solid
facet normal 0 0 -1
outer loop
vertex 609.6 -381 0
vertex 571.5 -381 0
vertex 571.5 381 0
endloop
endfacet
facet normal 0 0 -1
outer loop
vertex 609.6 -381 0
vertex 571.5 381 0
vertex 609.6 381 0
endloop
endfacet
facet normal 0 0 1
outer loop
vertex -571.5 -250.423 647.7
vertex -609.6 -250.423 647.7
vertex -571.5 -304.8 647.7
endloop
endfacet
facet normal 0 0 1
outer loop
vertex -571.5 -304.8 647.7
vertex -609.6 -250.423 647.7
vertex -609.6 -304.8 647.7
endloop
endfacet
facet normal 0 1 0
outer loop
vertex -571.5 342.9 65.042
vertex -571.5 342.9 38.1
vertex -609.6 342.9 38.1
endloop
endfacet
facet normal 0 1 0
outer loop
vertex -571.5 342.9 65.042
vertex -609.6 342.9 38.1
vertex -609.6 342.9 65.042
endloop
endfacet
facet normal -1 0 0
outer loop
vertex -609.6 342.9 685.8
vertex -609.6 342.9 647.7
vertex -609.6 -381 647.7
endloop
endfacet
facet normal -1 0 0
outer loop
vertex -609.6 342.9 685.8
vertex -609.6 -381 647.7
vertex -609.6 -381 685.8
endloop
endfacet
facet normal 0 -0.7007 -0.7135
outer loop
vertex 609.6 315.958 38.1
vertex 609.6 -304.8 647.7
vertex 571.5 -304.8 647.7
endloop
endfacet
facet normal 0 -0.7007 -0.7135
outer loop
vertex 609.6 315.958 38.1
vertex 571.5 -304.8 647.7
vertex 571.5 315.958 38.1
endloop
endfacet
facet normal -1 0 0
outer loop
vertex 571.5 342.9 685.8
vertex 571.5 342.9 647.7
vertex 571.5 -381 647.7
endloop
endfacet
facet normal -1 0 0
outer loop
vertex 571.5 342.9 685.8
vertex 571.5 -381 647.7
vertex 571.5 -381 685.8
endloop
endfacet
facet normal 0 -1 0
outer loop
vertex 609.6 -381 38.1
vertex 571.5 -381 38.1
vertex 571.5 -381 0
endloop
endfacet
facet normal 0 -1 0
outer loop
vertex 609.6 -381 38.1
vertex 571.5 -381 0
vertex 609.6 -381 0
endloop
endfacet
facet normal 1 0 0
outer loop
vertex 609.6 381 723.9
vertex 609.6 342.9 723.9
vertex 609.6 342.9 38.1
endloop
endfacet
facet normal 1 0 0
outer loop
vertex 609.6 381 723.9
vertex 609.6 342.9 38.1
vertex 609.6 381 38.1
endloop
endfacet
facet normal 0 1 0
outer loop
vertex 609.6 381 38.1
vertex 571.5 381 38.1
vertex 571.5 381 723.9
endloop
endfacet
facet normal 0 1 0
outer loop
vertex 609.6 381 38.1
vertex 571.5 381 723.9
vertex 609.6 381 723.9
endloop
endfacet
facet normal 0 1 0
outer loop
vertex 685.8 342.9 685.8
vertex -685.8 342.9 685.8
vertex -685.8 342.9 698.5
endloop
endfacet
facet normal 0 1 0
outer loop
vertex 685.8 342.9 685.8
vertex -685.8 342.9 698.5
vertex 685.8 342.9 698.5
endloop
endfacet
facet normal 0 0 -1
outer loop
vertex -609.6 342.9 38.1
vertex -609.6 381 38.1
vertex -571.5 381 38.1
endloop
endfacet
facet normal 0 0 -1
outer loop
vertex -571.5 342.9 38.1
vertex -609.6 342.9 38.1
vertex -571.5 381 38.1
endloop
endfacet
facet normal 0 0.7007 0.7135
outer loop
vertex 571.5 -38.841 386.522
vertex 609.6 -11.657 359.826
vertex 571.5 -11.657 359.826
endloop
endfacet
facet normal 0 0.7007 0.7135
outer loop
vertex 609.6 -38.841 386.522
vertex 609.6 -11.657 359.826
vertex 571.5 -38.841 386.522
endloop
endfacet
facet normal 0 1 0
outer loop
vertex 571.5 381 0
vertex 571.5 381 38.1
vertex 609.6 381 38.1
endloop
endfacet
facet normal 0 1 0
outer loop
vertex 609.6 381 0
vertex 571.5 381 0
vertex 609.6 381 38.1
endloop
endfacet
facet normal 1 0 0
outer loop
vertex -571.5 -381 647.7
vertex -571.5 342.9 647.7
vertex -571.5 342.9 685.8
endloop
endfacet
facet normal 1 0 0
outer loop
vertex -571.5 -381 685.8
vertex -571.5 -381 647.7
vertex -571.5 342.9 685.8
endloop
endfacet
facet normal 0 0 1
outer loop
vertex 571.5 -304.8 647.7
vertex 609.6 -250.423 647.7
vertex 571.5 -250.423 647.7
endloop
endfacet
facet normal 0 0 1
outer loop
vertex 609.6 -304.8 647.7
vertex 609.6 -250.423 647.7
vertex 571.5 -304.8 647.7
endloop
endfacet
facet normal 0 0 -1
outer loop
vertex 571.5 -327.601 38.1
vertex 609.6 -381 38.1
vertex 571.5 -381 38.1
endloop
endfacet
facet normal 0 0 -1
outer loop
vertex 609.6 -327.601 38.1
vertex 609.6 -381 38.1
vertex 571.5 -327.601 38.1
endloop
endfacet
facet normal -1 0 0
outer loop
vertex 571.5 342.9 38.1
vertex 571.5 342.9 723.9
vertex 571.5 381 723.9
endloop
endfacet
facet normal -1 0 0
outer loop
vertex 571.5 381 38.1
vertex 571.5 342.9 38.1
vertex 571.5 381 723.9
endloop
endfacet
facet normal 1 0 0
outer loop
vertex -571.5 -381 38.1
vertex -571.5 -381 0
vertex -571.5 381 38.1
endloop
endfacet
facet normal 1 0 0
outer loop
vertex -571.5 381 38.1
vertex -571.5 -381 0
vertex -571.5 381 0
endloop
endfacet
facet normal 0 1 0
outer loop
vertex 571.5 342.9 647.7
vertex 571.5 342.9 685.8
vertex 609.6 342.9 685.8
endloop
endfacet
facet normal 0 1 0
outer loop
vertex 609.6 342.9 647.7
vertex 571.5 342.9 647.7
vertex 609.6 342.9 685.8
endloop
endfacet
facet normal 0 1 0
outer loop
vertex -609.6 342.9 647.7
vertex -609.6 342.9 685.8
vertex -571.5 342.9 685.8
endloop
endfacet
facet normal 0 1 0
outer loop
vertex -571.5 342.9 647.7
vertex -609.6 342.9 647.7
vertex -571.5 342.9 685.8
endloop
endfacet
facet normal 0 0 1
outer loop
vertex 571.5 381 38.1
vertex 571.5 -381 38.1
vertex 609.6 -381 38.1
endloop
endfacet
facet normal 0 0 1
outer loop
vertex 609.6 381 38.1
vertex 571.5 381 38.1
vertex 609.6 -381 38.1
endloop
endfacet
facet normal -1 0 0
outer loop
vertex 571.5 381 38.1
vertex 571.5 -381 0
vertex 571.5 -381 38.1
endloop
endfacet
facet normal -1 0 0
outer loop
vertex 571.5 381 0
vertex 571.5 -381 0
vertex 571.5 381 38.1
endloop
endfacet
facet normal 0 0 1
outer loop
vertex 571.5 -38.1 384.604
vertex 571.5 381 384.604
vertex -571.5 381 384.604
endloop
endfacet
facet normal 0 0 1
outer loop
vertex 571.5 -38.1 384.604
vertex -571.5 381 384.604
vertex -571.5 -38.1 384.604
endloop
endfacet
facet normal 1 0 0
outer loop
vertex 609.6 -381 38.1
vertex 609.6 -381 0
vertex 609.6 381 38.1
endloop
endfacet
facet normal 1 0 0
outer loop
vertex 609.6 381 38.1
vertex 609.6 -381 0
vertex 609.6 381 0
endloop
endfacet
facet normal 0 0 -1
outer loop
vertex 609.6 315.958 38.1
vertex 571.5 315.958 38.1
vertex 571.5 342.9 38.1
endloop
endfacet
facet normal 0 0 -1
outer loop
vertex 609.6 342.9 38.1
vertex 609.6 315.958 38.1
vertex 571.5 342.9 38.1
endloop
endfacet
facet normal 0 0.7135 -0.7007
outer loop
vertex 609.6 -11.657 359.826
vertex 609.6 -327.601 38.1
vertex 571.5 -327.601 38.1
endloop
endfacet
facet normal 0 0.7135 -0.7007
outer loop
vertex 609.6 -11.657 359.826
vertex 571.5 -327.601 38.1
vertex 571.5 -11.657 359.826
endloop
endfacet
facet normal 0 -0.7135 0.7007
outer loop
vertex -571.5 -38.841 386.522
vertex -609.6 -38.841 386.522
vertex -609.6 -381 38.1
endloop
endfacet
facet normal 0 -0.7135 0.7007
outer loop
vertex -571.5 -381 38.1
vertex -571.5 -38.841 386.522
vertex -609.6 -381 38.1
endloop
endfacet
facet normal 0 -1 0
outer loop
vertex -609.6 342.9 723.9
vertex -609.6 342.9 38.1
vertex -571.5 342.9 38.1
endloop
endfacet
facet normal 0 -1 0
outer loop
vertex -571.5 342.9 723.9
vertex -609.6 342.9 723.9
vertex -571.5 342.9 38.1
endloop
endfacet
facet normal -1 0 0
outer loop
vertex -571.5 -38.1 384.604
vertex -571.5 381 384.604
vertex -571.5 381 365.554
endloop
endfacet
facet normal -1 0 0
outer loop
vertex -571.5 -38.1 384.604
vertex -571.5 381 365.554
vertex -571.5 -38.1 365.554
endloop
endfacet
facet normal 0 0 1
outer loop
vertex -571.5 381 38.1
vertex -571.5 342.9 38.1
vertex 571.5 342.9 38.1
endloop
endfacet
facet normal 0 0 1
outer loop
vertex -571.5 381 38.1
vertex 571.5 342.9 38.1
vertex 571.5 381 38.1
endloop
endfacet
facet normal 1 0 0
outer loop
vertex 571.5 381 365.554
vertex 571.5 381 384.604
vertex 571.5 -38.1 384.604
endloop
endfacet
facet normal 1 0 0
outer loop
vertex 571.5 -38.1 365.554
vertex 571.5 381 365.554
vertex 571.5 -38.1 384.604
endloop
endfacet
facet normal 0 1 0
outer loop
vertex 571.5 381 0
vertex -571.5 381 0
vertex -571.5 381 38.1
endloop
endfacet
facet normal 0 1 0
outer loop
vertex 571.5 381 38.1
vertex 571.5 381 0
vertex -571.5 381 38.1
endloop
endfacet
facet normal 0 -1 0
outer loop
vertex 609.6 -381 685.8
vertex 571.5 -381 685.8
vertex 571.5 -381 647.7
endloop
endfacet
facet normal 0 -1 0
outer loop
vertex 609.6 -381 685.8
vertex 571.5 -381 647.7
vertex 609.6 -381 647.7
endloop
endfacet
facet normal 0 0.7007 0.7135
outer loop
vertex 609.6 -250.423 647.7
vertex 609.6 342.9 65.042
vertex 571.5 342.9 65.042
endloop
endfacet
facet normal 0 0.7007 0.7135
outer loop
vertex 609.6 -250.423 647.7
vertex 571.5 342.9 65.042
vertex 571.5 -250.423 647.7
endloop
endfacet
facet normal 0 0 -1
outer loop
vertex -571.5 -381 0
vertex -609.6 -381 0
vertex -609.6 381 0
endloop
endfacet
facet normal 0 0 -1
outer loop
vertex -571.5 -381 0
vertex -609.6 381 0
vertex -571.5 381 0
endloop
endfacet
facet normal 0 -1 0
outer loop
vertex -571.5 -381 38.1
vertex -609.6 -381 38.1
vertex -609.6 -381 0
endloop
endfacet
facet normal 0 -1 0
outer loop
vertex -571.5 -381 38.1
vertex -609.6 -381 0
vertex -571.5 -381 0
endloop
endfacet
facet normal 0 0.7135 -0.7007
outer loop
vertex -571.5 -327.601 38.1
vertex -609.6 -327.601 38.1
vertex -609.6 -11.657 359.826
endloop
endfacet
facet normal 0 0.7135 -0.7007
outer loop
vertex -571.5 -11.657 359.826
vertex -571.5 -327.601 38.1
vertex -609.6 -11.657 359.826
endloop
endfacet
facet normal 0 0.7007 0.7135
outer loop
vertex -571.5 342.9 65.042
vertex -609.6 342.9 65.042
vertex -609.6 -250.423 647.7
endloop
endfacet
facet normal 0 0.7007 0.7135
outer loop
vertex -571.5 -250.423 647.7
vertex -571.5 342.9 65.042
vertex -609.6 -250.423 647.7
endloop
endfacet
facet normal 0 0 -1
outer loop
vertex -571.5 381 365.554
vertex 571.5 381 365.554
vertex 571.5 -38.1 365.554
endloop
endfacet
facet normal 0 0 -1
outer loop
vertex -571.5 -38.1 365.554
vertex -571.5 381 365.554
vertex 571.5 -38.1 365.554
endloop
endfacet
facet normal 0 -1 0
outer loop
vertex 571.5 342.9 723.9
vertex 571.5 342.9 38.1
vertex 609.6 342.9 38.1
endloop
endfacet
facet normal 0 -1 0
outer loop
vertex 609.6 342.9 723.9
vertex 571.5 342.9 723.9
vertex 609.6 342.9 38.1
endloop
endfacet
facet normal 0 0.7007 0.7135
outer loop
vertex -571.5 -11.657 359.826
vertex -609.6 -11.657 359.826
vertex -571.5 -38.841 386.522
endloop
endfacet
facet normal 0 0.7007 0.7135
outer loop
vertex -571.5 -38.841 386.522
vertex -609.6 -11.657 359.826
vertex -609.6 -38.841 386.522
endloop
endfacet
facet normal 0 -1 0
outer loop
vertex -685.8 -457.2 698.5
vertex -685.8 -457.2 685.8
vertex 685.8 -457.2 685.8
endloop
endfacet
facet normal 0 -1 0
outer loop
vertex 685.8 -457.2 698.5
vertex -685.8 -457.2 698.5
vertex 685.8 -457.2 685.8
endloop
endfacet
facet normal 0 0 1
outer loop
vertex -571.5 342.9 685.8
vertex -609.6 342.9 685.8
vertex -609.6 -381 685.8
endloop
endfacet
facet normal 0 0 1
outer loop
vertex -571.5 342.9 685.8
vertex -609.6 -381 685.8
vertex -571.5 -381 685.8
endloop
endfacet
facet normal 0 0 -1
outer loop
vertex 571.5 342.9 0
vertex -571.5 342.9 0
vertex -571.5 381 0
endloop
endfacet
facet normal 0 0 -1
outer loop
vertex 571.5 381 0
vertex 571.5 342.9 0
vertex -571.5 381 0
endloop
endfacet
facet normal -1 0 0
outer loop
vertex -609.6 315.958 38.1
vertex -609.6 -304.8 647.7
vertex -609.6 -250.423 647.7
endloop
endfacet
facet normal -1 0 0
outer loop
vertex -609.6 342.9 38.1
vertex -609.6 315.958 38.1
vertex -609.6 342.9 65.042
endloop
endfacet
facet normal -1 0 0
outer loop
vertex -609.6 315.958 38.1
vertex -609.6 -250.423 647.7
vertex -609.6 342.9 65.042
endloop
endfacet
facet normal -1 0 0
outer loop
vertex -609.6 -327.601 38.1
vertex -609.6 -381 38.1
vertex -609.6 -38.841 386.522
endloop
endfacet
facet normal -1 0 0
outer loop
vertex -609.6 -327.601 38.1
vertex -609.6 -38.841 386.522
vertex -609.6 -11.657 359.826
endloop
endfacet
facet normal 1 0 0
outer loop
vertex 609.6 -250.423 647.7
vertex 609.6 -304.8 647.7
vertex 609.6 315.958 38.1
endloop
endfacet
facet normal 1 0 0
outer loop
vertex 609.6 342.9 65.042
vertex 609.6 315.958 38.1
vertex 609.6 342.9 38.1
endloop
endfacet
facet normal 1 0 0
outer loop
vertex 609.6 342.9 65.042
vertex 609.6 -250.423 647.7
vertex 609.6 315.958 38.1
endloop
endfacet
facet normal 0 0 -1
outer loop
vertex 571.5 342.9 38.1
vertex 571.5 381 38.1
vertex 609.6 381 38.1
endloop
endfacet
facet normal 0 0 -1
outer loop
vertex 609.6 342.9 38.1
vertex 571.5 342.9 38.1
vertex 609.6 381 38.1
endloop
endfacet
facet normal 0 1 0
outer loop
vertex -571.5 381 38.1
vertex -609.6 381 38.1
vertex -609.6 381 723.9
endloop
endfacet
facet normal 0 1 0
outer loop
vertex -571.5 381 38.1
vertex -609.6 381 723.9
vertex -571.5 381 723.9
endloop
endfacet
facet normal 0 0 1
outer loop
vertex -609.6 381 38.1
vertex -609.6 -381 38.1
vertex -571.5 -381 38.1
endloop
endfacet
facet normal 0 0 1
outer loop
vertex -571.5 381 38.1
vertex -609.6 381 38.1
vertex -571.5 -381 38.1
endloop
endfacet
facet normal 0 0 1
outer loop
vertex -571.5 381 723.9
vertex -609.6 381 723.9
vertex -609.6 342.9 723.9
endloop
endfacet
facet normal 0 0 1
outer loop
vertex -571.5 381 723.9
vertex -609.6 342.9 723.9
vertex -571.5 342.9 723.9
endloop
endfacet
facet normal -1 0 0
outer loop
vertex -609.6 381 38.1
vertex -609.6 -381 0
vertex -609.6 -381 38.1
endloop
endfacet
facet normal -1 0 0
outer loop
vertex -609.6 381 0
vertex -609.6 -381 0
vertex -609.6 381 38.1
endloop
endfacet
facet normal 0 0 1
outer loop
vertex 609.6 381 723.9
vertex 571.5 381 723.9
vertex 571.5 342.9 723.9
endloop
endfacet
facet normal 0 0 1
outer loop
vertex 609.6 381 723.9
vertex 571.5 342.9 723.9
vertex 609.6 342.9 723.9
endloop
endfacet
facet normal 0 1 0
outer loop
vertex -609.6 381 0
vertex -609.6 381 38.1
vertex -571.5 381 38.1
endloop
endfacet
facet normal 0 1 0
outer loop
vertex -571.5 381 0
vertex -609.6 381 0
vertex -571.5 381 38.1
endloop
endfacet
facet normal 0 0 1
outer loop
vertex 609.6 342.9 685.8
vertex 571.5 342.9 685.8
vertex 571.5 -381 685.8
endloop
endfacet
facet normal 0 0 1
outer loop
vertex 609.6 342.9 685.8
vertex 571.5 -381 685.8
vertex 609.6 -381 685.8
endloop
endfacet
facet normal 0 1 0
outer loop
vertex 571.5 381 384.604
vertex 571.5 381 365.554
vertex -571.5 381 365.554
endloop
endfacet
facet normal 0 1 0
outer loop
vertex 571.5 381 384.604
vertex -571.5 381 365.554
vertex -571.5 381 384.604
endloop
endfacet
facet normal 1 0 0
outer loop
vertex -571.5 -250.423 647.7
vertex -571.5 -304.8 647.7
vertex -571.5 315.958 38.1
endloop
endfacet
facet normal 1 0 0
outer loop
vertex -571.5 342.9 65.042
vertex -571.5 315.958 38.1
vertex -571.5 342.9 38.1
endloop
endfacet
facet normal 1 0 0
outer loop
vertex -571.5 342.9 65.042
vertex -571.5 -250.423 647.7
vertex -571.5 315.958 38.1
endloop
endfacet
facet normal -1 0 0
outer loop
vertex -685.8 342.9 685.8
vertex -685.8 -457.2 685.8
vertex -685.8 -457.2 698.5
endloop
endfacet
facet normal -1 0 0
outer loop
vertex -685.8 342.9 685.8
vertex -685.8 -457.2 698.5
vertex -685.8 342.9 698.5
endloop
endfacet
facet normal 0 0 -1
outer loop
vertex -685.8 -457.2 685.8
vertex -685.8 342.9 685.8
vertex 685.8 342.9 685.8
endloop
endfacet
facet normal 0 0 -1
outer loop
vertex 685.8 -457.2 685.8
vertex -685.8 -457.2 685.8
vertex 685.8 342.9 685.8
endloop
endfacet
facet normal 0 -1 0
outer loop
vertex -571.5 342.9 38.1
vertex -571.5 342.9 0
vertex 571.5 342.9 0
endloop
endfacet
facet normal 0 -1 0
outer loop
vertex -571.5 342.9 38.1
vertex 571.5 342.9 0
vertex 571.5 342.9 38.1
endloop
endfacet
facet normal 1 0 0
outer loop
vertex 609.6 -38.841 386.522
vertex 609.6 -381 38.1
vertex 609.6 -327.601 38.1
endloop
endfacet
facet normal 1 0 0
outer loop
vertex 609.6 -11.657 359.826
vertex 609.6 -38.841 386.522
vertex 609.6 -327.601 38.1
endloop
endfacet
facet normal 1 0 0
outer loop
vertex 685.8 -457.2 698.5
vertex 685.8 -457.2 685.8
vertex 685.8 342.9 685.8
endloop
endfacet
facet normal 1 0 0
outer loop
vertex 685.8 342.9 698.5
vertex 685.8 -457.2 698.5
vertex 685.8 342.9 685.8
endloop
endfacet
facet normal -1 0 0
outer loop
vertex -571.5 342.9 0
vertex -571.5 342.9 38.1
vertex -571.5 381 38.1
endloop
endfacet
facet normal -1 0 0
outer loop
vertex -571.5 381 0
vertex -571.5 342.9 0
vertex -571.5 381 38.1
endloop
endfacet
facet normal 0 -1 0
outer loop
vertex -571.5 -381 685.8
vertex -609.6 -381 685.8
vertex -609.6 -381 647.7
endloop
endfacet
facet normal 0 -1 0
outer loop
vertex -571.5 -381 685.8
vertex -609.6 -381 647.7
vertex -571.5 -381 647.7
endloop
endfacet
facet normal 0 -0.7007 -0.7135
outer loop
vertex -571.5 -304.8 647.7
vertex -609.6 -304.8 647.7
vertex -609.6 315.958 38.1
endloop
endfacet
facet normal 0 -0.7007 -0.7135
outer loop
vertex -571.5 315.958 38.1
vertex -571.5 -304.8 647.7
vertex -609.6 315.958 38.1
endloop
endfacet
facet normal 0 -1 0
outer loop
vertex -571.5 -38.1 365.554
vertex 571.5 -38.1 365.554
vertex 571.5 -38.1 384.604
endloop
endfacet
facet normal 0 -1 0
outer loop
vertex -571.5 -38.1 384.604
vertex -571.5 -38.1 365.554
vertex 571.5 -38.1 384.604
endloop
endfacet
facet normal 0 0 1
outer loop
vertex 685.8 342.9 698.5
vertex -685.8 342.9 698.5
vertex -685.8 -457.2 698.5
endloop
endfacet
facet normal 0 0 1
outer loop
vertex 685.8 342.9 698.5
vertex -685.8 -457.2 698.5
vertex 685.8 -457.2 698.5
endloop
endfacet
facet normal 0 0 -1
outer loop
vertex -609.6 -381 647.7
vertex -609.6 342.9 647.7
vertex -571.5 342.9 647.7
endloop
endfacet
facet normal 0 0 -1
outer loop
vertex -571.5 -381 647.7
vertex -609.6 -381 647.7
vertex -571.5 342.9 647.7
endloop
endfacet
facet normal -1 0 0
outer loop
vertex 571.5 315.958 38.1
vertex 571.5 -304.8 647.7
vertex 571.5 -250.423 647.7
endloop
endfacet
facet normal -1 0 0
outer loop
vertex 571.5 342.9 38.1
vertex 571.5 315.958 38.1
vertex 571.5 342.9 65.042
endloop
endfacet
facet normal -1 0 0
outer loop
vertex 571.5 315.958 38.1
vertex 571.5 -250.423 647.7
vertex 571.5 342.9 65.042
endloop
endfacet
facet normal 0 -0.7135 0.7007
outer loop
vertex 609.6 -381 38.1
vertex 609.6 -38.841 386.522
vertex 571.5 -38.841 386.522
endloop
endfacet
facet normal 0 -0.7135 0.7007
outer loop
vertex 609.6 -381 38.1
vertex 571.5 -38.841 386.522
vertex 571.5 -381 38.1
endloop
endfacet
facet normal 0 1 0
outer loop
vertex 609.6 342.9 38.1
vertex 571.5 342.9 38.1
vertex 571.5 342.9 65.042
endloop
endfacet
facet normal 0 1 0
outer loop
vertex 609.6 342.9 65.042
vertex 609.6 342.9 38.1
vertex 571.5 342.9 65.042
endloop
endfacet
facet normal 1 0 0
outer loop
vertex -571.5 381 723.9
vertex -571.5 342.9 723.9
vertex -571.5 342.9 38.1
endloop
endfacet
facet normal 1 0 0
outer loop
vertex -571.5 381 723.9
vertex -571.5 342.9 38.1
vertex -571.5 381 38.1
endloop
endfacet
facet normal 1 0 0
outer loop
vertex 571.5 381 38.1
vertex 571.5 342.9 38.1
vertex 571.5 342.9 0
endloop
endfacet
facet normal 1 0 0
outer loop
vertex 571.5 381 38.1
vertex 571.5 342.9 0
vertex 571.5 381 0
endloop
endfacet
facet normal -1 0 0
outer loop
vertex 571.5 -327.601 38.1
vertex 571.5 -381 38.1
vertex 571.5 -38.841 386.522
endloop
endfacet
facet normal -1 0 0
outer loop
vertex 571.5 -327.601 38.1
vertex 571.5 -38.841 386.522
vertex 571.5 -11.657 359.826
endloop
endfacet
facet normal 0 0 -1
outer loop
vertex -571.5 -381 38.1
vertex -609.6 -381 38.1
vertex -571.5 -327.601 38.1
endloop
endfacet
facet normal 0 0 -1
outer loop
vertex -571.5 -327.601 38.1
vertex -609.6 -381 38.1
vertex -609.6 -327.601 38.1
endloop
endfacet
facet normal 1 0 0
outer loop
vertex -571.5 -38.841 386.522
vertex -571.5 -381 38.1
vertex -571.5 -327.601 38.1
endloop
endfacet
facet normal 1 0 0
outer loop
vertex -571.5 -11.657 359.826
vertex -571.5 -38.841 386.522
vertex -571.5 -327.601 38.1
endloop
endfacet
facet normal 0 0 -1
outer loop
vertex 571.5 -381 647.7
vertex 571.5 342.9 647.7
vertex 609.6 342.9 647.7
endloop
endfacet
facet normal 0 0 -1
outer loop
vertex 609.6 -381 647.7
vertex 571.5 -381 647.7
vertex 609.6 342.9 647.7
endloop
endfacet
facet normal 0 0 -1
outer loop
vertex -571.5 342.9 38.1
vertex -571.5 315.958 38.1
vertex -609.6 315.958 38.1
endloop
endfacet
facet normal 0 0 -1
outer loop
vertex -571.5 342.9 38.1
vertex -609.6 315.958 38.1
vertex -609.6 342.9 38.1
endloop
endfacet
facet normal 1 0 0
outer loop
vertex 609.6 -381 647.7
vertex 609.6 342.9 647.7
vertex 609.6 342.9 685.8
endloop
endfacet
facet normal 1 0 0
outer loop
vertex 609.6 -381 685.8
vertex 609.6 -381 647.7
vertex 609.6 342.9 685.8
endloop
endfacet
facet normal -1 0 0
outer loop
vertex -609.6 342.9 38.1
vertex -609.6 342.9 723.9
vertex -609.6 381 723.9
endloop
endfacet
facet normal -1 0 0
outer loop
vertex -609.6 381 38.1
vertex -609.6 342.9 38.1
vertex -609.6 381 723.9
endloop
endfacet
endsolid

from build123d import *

# Parameters (mm, degrees)
F0_W           = 38.1
F0_H           = 762
F1_DEPTH       = 38.1
F2_W           = 38.1
F2_H           = 38.1
F3_DEPTH       = 685.8
F5_DEPTH       = 38.1
F6_W           = 38.1
F6_H           = 38.1
F7_DEPTH       = 723.9
F9_W           = 419.1
F9_H           = 19.05
F10_DEPTH      = 1143
F11_W          = 1371.6
F11_H          = 800.1
F12_DEPTH      = 12.7
F13_W          = 38.1
F13_H          = 38.1
F14_DEPTH      = 571.5
F14_DEPTH_BACK = 571.5
F16_DEPTH      = 38.1


with BuildPart() as f1:
    # F0 (on Top) → F1 (new body)
    with BuildSketch(Plane.XY):
        with Locations((-590.55, 0)):
            Rectangle(F0_W, F0_H)
        with Locations((590.55, 0)):
            Rectangle(F0_W, F0_H)
    extrude(amount=F1_DEPTH)


with BuildPart() as f3:
    # F2 (on face) → F3 (new body)
    with BuildSketch(Plane.XY.offset(38.1)):
        with Locations((-590.55, 361.95)):
            Rectangle(F2_W, F2_H)
        with Locations((590.55, 361.95)):
            Rectangle(F2_W, F2_H)
    extrude(amount=F3_DEPTH)


with BuildPart() as f5:
    # F4 (on face) → F5 (new body)
    with BuildSketch(Plane.YZ.offset(609.6)):
        Polygon((315.958124, 38.1), (342.9, 38.1), (342.9, 65.041876), (-250.423103, 647.7), (-304.8, 647.7), align=None)
    extrude(amount=-F5_DEPTH)


with BuildPart() as f7:
    # F6 (on face) → F7 (new body)
    with BuildSketch(Plane.XZ.offset(-342.9)):
        with Locations((-590.55, 666.75)):
            Rectangle(F6_W, F6_H)
        with Locations((590.55, 666.75)):
            Rectangle(F6_W, F6_H)
    extrude(amount=F7_DEPTH)


with BuildPart() as f8_1:
    # F8: instance of F5
    add(f5.part.mirror(Plane.YZ))


with BuildPart() as f10:
    # F9 (on face) → F10 (new body, through all)
    with BuildSketch(Plane(origin=(571.5, 0, 0), x_dir=(0, -1, 0), z_dir=(-1, 0, 0))):
        with Locations((-171.45, 375.078514)):
            Rectangle(F9_W, F9_H)
    extrude(amount=F10_DEPTH)


with BuildPart() as f12:
    # F11 (on face) → F12 (new body)
    with BuildSketch(Plane.XY.offset(685.8)):
        with Locations((0, -57.15)):
            Rectangle(F11_W, F11_H)
    extrude(amount=F12_DEPTH)


with BuildPart() as f14:
    # F13 (on Right) → F14 (new body, two sides)
    with BuildSketch(Plane.YZ) as f14_sk:
        with Locations((361.95, 19.05)):
            Rectangle(F13_W, F13_H)
    extrude(amount=F14_DEPTH)
    extrude(f14_sk.sketch, amount=-F14_DEPTH_BACK)


with BuildPart() as f16:
    # F15 (on face) → F16 (new body)
    with BuildSketch(Plane.YZ.offset(609.6)):
        Polygon((-38.841135, 386.521744), (-381, 38.1), (-327.600528, 38.1), (-11.657158, 359.826399), align=None)
    extrude(amount=-F16_DEPTH)


with BuildPart() as f17_1:
    # F17: instance of F16
    add(f16.part.mirror(Plane.YZ))


solid = Compound([f1.part, f3.part, f5.part, f7.part, f8_1.part, f10.part, f12.part, f14.part, f16.part, f17_1.part])
